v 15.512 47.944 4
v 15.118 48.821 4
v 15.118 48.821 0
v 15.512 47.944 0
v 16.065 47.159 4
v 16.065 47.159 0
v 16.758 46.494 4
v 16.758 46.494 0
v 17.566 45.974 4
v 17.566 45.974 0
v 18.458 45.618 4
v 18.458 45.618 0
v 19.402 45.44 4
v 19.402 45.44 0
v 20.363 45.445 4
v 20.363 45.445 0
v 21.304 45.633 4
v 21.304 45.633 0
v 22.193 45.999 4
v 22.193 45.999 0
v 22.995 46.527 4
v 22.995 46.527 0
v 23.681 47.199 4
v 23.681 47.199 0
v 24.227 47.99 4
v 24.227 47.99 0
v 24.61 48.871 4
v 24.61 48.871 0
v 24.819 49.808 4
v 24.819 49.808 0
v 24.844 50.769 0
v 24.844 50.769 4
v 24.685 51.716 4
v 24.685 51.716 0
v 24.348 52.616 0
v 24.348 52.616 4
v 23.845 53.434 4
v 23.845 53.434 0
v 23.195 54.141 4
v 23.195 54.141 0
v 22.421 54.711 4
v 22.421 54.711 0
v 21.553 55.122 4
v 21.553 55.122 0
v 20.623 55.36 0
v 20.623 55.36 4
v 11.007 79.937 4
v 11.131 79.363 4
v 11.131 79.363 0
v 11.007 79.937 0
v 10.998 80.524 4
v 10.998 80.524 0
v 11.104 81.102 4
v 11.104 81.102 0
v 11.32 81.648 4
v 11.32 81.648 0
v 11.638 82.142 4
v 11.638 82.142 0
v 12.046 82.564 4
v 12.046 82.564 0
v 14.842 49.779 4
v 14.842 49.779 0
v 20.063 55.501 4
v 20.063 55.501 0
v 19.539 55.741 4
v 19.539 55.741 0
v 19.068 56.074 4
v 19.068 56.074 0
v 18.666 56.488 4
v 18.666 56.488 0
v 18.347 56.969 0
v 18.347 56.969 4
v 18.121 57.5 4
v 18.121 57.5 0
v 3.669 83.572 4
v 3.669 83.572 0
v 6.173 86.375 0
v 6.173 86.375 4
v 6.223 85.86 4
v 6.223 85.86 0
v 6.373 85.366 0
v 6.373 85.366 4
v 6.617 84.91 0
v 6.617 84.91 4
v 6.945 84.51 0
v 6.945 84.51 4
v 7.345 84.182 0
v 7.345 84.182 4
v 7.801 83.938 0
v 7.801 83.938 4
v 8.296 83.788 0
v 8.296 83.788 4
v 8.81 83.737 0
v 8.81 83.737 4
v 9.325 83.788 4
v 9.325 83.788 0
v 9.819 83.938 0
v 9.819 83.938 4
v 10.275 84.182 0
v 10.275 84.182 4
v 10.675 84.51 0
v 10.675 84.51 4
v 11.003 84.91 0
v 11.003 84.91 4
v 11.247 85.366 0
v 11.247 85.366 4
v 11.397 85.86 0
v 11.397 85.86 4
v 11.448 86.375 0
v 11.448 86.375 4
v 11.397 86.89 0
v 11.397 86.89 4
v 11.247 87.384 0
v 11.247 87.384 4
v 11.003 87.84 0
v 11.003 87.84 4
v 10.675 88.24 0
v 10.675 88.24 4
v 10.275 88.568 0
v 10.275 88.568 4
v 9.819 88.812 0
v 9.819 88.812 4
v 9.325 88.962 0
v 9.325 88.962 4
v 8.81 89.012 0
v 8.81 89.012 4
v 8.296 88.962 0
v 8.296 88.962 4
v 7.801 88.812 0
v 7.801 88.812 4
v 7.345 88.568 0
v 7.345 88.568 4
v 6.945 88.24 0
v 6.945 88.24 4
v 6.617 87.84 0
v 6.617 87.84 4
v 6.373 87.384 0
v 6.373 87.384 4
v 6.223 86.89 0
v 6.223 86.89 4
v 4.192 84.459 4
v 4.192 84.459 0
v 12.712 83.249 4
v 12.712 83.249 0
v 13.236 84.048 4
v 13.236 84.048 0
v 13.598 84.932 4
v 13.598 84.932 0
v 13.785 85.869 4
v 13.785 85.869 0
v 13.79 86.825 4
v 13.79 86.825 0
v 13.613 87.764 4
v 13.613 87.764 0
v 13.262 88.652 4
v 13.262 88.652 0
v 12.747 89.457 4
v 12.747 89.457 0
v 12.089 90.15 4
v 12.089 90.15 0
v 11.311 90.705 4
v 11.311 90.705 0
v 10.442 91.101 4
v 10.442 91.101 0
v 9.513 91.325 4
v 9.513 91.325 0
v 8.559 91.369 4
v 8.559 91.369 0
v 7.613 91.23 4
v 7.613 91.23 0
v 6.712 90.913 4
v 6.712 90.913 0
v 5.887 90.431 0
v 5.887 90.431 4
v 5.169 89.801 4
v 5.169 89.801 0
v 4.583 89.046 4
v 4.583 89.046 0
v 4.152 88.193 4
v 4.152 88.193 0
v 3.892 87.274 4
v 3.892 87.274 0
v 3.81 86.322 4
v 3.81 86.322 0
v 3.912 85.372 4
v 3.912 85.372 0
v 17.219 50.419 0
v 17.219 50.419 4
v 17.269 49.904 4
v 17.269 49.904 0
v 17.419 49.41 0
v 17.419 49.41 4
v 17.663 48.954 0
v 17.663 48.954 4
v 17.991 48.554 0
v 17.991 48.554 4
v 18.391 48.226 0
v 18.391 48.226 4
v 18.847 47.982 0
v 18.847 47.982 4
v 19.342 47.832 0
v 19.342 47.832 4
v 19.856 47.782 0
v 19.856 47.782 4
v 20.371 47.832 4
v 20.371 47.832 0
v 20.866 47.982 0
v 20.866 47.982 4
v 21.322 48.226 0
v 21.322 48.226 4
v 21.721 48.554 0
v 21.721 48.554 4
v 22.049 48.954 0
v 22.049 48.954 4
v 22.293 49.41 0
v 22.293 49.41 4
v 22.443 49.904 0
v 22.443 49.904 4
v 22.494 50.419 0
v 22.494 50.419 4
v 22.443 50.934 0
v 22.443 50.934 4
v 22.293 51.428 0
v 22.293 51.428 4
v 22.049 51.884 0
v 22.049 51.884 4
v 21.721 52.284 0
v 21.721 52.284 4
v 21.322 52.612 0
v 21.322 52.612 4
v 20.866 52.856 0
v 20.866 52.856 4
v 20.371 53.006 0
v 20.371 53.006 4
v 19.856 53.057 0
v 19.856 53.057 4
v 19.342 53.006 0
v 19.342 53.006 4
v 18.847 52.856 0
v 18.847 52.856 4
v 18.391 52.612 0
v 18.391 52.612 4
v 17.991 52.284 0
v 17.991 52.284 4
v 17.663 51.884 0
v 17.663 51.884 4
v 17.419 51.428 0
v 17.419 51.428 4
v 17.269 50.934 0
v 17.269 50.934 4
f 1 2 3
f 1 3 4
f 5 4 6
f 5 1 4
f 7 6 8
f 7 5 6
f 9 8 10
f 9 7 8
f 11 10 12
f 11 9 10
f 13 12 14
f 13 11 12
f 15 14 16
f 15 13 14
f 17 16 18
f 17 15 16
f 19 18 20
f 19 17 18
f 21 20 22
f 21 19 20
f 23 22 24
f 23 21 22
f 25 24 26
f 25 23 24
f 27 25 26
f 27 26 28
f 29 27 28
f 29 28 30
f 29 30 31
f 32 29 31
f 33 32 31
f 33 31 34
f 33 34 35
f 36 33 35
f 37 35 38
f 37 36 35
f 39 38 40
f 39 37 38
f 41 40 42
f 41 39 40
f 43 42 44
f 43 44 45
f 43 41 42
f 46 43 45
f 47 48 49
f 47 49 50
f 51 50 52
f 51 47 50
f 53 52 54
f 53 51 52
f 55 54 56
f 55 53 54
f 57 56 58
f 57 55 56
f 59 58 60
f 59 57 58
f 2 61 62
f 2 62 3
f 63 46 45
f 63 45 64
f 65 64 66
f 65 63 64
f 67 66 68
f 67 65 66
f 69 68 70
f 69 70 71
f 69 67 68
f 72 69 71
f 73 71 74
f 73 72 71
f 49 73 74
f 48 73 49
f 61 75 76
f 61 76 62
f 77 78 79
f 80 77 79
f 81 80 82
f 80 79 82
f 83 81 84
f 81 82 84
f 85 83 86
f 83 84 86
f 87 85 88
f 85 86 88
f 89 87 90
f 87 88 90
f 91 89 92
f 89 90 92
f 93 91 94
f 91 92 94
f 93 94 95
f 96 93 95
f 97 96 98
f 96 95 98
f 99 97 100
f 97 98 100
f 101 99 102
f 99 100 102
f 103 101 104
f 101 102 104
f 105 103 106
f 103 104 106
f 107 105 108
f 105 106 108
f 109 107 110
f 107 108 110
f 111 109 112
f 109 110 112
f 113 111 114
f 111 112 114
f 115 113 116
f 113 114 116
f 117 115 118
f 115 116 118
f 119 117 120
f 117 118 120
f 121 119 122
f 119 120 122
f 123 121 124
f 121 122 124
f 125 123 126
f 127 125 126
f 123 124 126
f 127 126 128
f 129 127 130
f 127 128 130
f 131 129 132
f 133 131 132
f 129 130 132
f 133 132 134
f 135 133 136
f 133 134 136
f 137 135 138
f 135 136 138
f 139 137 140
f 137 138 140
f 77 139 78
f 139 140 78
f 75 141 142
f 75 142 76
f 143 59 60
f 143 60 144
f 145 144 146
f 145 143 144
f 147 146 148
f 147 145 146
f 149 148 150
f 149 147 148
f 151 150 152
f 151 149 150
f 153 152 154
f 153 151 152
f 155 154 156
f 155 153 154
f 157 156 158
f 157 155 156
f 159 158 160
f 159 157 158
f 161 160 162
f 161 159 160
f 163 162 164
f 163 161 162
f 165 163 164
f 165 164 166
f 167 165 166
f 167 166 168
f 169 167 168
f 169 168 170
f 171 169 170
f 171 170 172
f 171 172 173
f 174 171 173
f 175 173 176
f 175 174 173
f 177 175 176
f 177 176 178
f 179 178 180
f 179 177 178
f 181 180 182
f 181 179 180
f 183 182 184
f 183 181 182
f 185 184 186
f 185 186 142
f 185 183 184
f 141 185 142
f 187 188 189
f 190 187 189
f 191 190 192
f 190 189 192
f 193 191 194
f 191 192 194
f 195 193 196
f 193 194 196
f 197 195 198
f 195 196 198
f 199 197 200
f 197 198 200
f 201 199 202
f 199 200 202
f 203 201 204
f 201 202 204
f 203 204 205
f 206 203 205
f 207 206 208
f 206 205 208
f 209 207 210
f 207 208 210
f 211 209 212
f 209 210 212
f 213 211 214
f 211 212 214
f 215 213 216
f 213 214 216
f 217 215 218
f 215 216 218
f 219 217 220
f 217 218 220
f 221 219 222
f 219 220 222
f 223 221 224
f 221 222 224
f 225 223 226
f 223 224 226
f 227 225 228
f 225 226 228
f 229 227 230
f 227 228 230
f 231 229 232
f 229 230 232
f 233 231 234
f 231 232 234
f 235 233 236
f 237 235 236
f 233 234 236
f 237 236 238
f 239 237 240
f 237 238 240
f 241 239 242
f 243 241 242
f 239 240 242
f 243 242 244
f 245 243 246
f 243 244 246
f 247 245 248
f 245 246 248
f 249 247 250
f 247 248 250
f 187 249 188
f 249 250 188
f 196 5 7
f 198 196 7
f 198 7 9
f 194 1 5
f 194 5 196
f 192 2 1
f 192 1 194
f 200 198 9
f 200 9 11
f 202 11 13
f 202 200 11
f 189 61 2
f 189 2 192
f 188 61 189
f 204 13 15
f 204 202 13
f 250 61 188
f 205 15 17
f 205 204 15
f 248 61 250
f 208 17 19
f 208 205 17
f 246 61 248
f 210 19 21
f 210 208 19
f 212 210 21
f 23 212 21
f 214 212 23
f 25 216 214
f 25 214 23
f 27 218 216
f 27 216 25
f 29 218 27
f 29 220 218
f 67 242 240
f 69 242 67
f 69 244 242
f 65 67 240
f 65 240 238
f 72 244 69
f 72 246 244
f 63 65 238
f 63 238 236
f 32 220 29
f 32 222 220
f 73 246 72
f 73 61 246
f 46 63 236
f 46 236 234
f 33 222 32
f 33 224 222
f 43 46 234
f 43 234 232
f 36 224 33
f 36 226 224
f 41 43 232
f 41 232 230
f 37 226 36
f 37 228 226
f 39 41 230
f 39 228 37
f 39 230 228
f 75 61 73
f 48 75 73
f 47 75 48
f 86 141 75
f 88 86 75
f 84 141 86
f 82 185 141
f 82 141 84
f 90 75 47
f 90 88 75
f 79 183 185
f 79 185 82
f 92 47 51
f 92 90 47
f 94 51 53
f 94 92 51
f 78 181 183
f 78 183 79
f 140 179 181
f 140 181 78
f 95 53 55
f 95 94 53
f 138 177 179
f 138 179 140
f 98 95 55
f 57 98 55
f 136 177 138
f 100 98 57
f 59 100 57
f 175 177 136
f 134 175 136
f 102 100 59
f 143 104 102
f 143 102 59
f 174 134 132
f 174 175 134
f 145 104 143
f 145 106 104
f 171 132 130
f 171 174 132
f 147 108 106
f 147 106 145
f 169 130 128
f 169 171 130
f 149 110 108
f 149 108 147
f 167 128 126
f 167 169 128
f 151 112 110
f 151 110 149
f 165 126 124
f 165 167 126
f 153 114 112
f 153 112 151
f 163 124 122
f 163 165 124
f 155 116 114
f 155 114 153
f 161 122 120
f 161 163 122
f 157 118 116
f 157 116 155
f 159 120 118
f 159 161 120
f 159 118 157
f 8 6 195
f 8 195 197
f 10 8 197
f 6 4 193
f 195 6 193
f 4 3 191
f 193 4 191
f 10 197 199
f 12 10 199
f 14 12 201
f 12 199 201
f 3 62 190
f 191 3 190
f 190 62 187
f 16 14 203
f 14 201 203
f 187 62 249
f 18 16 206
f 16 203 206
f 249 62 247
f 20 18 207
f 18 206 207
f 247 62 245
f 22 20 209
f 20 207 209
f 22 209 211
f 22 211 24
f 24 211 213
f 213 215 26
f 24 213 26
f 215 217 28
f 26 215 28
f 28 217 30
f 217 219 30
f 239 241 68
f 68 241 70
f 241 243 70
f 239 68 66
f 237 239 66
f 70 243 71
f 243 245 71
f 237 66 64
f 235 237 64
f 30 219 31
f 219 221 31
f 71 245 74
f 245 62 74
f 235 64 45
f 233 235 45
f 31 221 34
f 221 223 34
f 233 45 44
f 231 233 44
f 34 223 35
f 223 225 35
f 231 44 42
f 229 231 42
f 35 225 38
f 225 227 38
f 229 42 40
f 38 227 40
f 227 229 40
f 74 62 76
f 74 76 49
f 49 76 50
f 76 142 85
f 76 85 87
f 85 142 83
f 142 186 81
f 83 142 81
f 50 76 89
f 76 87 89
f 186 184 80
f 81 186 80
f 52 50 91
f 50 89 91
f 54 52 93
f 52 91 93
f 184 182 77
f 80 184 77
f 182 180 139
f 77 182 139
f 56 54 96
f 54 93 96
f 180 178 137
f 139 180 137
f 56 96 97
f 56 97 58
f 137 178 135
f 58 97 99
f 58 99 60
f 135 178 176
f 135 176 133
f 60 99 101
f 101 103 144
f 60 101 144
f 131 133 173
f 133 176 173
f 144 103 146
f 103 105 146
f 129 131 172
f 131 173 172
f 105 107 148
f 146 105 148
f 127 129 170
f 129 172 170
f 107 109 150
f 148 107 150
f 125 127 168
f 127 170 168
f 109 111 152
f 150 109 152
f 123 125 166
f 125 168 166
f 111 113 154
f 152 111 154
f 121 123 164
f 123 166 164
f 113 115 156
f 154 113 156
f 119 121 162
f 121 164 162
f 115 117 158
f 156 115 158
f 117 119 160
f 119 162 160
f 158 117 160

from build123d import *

# Parameters (mm, degrees)
SKETCH1_R           = 2.6375
BOSS_EXTRUDE1_DEPTH = 4


with BuildPart() as part:
    # Sketch1 → Boss-Extrude1 (new body)
    with BuildSketch(Plane.XY.offset(4)):
        with BuildLine():
            Line((18.121313038, 57.499552699), (11.130625568, 79.363045761))
            ThreePointArc((11.130625568, 79.363045761), (11.103854309, 81.101969158), (12.046376558, 82.563551551))
            ThreePointArc((12.046376558, 82.563551551), (9.982846794, 91.235495297), (4.191986809, 84.458570917))
            Line((4.191986809, 84.458570917), (3.669492538, 83.571702076))
            Line((3.669492538, 83.571702076), (14.841853522, 49.779462629))
            Line((14.841853522, 49.779462629), (15.118467898, 48.820925017))
            ThreePointArc((15.118467898, 48.820925017), (23.681425942, 47.199148201), (20.62266155, 55.359930695))
            ThreePointArc((20.62266155, 55.359930695), (19.067995929, 56.074357266), (18.121313038, 57.499552699))
        make_face()
        with Locations(Location((19.856196321, 50.419026825, 0), (0, 0, 180))):
            Circle(SKETCH1_R, mode=Mode.SUBTRACT)
        with Locations(Location((8.810151598, 86.374961789, 0), (0, 0, 180))):
            Circle(SKETCH1_R, mode=Mode.SUBTRACT)
    extrude(amount=-BOSS_EXTRUDE1_DEPTH)


solid = part.part
